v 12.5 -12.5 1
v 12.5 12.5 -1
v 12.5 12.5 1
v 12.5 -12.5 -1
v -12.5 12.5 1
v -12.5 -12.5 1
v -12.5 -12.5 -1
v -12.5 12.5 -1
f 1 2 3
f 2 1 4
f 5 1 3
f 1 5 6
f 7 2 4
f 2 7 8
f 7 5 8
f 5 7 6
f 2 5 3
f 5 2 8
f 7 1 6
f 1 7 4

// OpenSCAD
tailleCase=25;
emplacementLame=20;
nbDents=20;
nbLames=3;
difference(){
translate([0,0,0]){
cube([tailleCase,tailleCase,2],center=true);
for(i=[1:nbLames]){
translate([0,emplacementLame/2-emplacementLame/(nbLames+1)*i,0]){
rotate([90,0,0])
{
    for (i=[0:nbDents]){
rotate([0,0,(360/nbDents)*i])
translate([0,10,0.5])
polygon(points=[[0,0],[5,1],[3,-1]]);
}
    cylinder(d=20);
}
}
}
}

translate([0,0,-tailleCase/2-1]){
cube([tailleCase,tailleCase,tailleCase],center=true);
}
}
